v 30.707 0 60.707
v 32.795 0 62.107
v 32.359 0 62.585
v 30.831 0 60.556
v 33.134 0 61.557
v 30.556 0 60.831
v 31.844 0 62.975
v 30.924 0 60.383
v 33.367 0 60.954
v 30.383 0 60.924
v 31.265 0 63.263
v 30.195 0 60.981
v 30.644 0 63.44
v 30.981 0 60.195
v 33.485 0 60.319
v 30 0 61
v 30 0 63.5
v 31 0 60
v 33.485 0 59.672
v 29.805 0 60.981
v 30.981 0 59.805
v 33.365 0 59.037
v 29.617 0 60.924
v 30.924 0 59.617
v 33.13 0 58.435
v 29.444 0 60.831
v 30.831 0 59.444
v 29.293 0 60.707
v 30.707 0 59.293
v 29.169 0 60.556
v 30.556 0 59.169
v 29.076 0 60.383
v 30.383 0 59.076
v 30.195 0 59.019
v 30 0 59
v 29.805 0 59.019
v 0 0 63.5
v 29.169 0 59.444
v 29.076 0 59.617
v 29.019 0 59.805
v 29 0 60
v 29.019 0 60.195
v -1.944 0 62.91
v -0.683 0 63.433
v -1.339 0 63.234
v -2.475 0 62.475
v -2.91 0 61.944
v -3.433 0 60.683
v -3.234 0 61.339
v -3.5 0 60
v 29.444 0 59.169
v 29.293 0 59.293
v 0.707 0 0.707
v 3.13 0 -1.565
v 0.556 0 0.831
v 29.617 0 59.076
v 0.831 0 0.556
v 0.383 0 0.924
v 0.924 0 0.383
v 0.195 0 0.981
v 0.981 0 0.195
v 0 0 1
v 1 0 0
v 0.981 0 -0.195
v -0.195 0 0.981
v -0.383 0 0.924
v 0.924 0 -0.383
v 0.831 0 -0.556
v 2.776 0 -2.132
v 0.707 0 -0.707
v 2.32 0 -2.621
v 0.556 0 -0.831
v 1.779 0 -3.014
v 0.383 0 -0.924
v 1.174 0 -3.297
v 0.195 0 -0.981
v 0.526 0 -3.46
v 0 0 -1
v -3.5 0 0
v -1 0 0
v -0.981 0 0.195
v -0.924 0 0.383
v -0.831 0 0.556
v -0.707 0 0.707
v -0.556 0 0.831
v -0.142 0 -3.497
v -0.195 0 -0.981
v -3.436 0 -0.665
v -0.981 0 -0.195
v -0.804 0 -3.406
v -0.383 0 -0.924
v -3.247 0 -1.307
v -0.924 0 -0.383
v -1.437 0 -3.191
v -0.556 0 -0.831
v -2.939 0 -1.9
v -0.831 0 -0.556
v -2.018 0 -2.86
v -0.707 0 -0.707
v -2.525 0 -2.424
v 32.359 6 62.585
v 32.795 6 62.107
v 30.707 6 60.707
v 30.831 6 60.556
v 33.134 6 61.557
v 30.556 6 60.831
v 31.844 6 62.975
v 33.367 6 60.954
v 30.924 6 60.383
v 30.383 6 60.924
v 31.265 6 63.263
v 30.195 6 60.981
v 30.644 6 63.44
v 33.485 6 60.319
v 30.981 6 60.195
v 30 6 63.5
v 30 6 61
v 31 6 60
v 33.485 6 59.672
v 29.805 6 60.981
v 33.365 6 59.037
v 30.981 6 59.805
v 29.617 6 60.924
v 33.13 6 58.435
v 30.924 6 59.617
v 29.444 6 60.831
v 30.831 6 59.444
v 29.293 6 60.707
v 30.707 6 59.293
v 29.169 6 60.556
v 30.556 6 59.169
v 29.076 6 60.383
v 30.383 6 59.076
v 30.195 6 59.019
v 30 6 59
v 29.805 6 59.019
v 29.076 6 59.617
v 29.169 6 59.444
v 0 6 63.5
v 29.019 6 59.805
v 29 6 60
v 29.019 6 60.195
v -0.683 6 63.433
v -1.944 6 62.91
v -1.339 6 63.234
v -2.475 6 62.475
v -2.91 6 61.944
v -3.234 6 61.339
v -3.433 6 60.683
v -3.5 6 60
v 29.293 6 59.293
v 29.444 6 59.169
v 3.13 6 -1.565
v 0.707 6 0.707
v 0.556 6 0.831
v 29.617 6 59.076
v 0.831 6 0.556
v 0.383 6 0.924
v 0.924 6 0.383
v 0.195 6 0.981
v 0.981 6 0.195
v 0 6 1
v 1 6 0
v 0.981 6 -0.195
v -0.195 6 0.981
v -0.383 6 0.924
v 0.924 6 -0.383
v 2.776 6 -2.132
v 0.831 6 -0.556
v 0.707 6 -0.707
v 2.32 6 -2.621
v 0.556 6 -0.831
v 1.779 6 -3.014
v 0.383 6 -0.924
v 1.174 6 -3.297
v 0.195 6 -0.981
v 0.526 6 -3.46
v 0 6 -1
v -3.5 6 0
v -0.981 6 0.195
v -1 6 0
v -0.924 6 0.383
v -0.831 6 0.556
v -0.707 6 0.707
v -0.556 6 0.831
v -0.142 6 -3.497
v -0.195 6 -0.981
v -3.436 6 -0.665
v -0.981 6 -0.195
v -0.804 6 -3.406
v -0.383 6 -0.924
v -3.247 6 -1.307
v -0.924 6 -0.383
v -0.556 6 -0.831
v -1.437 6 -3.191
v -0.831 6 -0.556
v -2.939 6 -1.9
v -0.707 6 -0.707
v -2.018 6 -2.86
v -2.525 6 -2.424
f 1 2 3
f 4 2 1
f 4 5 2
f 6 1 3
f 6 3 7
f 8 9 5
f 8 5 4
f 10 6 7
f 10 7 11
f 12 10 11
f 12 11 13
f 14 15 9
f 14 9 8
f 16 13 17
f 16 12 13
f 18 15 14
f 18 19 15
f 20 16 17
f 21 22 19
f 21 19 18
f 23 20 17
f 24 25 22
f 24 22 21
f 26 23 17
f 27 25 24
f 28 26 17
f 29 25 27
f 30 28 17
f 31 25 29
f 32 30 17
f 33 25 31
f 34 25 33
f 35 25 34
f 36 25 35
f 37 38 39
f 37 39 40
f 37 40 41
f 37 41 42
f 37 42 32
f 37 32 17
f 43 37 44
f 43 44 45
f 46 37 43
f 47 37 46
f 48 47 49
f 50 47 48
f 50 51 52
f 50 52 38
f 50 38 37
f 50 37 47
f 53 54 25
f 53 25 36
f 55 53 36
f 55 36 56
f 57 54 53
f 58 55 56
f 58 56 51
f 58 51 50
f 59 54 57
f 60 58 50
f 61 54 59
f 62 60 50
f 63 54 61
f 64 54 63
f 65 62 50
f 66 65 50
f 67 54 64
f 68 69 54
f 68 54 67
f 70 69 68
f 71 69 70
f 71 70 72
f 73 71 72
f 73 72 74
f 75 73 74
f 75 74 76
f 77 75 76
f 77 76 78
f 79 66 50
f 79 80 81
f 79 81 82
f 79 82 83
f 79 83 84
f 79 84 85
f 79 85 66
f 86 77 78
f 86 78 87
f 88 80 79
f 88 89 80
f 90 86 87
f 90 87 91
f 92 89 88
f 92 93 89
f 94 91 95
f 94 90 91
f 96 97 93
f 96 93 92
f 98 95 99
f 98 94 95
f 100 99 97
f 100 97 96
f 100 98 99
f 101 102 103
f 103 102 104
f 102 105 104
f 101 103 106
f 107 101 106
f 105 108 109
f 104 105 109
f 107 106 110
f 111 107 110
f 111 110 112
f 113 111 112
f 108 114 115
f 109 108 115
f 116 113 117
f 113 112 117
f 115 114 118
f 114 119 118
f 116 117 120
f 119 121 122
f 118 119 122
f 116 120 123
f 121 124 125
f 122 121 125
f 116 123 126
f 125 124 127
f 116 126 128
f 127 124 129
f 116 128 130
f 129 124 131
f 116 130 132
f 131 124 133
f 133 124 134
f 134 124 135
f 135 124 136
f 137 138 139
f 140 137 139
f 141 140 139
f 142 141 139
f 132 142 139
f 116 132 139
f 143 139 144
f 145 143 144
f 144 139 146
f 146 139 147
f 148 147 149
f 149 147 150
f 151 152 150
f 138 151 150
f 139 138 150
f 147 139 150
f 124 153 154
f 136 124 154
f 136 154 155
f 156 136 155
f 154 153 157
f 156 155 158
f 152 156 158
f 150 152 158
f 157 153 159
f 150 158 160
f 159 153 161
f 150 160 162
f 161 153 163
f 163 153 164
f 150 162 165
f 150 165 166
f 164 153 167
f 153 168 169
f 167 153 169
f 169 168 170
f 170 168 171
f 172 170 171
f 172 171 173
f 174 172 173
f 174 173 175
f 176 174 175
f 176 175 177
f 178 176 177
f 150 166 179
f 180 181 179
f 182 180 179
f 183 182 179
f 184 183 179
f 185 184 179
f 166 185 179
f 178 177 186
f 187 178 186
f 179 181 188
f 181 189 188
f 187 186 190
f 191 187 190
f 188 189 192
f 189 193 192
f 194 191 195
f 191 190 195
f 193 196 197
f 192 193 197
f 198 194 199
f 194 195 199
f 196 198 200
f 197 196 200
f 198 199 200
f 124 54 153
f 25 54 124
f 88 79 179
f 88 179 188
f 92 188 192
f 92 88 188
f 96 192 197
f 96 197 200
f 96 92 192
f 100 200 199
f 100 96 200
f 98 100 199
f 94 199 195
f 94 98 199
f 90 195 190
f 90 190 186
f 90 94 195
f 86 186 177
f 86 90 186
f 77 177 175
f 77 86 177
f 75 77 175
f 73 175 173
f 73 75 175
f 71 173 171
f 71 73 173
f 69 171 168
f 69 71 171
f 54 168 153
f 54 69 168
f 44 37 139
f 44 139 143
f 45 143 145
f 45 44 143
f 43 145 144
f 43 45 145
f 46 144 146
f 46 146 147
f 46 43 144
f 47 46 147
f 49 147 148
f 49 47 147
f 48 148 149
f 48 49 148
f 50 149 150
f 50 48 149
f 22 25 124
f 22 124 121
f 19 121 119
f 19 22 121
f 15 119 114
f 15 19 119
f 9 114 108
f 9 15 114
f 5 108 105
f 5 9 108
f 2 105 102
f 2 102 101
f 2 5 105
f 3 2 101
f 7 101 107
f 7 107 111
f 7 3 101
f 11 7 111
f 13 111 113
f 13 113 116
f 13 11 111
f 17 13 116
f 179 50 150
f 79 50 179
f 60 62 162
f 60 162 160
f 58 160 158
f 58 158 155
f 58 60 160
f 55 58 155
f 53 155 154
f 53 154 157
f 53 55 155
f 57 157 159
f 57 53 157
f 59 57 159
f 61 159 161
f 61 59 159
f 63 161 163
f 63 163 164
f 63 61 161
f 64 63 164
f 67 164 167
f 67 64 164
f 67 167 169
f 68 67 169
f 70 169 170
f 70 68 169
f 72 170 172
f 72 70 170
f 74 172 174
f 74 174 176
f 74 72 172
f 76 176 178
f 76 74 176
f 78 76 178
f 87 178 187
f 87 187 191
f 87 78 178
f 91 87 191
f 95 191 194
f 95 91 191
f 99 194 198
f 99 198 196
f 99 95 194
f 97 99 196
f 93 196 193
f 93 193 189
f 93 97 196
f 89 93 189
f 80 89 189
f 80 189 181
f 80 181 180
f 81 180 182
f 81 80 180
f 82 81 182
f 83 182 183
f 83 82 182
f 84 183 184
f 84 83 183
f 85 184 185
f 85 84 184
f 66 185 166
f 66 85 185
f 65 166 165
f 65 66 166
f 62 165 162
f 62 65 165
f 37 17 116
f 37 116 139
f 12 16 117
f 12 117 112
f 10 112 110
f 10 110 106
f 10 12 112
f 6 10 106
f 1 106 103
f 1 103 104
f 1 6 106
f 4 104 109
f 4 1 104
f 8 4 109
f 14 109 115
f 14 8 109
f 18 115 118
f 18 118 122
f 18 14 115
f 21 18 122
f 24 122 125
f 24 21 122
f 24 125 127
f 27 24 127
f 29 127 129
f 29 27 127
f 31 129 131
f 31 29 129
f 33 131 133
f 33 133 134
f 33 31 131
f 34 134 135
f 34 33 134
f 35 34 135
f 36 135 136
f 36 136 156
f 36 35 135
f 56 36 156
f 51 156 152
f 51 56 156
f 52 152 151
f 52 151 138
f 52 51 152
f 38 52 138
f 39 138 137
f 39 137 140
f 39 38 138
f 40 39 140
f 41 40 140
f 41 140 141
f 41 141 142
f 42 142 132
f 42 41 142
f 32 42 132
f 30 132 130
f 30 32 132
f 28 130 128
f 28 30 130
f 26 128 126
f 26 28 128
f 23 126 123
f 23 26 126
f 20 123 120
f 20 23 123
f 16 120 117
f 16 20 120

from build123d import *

# Parameters (mm, degrees)
SKETCH1_R           = 1
BOSS_EXTRUDE1_DEPTH = 6


with BuildPart() as part:
    # Sketch1 → Boss-Extrude1 (new body)
    with BuildSketch(Plane(origin=(0, 0, 0), x_dir=(1, 0, 0), z_dir=(0, 1, 0))):
        with BuildLine():
            Line((30, -63.5), (0, -63.5))
            ThreePointArc((0, -63.5), (-2.474873734, -62.474873734), (-3.5, -60))
            Line((-3.5, -60), (-3.5, 0))
            ThreePointArc((-3.5, 0), (-0.804135222, 3.406371463), (3.130495168, 1.565247584))
            Line((3.130495168, 1.565247584), (33.130495168, -58.434752416))
            ThreePointArc((33.130495168, -58.434752416), (32.977277829, -61.840058892), (30, -63.5))
        make_face()
        with Locations(Location((0, 0, 0), (0, 0, 270))):
            Circle(SKETCH1_R, mode=Mode.SUBTRACT)
        with Locations(Location((30, -60, 0), (0, 0, 270))):
            Circle(SKETCH1_R, mode=Mode.SUBTRACT)
    extrude(amount=BOSS_EXTRUDE1_DEPTH)


solid = part.part
